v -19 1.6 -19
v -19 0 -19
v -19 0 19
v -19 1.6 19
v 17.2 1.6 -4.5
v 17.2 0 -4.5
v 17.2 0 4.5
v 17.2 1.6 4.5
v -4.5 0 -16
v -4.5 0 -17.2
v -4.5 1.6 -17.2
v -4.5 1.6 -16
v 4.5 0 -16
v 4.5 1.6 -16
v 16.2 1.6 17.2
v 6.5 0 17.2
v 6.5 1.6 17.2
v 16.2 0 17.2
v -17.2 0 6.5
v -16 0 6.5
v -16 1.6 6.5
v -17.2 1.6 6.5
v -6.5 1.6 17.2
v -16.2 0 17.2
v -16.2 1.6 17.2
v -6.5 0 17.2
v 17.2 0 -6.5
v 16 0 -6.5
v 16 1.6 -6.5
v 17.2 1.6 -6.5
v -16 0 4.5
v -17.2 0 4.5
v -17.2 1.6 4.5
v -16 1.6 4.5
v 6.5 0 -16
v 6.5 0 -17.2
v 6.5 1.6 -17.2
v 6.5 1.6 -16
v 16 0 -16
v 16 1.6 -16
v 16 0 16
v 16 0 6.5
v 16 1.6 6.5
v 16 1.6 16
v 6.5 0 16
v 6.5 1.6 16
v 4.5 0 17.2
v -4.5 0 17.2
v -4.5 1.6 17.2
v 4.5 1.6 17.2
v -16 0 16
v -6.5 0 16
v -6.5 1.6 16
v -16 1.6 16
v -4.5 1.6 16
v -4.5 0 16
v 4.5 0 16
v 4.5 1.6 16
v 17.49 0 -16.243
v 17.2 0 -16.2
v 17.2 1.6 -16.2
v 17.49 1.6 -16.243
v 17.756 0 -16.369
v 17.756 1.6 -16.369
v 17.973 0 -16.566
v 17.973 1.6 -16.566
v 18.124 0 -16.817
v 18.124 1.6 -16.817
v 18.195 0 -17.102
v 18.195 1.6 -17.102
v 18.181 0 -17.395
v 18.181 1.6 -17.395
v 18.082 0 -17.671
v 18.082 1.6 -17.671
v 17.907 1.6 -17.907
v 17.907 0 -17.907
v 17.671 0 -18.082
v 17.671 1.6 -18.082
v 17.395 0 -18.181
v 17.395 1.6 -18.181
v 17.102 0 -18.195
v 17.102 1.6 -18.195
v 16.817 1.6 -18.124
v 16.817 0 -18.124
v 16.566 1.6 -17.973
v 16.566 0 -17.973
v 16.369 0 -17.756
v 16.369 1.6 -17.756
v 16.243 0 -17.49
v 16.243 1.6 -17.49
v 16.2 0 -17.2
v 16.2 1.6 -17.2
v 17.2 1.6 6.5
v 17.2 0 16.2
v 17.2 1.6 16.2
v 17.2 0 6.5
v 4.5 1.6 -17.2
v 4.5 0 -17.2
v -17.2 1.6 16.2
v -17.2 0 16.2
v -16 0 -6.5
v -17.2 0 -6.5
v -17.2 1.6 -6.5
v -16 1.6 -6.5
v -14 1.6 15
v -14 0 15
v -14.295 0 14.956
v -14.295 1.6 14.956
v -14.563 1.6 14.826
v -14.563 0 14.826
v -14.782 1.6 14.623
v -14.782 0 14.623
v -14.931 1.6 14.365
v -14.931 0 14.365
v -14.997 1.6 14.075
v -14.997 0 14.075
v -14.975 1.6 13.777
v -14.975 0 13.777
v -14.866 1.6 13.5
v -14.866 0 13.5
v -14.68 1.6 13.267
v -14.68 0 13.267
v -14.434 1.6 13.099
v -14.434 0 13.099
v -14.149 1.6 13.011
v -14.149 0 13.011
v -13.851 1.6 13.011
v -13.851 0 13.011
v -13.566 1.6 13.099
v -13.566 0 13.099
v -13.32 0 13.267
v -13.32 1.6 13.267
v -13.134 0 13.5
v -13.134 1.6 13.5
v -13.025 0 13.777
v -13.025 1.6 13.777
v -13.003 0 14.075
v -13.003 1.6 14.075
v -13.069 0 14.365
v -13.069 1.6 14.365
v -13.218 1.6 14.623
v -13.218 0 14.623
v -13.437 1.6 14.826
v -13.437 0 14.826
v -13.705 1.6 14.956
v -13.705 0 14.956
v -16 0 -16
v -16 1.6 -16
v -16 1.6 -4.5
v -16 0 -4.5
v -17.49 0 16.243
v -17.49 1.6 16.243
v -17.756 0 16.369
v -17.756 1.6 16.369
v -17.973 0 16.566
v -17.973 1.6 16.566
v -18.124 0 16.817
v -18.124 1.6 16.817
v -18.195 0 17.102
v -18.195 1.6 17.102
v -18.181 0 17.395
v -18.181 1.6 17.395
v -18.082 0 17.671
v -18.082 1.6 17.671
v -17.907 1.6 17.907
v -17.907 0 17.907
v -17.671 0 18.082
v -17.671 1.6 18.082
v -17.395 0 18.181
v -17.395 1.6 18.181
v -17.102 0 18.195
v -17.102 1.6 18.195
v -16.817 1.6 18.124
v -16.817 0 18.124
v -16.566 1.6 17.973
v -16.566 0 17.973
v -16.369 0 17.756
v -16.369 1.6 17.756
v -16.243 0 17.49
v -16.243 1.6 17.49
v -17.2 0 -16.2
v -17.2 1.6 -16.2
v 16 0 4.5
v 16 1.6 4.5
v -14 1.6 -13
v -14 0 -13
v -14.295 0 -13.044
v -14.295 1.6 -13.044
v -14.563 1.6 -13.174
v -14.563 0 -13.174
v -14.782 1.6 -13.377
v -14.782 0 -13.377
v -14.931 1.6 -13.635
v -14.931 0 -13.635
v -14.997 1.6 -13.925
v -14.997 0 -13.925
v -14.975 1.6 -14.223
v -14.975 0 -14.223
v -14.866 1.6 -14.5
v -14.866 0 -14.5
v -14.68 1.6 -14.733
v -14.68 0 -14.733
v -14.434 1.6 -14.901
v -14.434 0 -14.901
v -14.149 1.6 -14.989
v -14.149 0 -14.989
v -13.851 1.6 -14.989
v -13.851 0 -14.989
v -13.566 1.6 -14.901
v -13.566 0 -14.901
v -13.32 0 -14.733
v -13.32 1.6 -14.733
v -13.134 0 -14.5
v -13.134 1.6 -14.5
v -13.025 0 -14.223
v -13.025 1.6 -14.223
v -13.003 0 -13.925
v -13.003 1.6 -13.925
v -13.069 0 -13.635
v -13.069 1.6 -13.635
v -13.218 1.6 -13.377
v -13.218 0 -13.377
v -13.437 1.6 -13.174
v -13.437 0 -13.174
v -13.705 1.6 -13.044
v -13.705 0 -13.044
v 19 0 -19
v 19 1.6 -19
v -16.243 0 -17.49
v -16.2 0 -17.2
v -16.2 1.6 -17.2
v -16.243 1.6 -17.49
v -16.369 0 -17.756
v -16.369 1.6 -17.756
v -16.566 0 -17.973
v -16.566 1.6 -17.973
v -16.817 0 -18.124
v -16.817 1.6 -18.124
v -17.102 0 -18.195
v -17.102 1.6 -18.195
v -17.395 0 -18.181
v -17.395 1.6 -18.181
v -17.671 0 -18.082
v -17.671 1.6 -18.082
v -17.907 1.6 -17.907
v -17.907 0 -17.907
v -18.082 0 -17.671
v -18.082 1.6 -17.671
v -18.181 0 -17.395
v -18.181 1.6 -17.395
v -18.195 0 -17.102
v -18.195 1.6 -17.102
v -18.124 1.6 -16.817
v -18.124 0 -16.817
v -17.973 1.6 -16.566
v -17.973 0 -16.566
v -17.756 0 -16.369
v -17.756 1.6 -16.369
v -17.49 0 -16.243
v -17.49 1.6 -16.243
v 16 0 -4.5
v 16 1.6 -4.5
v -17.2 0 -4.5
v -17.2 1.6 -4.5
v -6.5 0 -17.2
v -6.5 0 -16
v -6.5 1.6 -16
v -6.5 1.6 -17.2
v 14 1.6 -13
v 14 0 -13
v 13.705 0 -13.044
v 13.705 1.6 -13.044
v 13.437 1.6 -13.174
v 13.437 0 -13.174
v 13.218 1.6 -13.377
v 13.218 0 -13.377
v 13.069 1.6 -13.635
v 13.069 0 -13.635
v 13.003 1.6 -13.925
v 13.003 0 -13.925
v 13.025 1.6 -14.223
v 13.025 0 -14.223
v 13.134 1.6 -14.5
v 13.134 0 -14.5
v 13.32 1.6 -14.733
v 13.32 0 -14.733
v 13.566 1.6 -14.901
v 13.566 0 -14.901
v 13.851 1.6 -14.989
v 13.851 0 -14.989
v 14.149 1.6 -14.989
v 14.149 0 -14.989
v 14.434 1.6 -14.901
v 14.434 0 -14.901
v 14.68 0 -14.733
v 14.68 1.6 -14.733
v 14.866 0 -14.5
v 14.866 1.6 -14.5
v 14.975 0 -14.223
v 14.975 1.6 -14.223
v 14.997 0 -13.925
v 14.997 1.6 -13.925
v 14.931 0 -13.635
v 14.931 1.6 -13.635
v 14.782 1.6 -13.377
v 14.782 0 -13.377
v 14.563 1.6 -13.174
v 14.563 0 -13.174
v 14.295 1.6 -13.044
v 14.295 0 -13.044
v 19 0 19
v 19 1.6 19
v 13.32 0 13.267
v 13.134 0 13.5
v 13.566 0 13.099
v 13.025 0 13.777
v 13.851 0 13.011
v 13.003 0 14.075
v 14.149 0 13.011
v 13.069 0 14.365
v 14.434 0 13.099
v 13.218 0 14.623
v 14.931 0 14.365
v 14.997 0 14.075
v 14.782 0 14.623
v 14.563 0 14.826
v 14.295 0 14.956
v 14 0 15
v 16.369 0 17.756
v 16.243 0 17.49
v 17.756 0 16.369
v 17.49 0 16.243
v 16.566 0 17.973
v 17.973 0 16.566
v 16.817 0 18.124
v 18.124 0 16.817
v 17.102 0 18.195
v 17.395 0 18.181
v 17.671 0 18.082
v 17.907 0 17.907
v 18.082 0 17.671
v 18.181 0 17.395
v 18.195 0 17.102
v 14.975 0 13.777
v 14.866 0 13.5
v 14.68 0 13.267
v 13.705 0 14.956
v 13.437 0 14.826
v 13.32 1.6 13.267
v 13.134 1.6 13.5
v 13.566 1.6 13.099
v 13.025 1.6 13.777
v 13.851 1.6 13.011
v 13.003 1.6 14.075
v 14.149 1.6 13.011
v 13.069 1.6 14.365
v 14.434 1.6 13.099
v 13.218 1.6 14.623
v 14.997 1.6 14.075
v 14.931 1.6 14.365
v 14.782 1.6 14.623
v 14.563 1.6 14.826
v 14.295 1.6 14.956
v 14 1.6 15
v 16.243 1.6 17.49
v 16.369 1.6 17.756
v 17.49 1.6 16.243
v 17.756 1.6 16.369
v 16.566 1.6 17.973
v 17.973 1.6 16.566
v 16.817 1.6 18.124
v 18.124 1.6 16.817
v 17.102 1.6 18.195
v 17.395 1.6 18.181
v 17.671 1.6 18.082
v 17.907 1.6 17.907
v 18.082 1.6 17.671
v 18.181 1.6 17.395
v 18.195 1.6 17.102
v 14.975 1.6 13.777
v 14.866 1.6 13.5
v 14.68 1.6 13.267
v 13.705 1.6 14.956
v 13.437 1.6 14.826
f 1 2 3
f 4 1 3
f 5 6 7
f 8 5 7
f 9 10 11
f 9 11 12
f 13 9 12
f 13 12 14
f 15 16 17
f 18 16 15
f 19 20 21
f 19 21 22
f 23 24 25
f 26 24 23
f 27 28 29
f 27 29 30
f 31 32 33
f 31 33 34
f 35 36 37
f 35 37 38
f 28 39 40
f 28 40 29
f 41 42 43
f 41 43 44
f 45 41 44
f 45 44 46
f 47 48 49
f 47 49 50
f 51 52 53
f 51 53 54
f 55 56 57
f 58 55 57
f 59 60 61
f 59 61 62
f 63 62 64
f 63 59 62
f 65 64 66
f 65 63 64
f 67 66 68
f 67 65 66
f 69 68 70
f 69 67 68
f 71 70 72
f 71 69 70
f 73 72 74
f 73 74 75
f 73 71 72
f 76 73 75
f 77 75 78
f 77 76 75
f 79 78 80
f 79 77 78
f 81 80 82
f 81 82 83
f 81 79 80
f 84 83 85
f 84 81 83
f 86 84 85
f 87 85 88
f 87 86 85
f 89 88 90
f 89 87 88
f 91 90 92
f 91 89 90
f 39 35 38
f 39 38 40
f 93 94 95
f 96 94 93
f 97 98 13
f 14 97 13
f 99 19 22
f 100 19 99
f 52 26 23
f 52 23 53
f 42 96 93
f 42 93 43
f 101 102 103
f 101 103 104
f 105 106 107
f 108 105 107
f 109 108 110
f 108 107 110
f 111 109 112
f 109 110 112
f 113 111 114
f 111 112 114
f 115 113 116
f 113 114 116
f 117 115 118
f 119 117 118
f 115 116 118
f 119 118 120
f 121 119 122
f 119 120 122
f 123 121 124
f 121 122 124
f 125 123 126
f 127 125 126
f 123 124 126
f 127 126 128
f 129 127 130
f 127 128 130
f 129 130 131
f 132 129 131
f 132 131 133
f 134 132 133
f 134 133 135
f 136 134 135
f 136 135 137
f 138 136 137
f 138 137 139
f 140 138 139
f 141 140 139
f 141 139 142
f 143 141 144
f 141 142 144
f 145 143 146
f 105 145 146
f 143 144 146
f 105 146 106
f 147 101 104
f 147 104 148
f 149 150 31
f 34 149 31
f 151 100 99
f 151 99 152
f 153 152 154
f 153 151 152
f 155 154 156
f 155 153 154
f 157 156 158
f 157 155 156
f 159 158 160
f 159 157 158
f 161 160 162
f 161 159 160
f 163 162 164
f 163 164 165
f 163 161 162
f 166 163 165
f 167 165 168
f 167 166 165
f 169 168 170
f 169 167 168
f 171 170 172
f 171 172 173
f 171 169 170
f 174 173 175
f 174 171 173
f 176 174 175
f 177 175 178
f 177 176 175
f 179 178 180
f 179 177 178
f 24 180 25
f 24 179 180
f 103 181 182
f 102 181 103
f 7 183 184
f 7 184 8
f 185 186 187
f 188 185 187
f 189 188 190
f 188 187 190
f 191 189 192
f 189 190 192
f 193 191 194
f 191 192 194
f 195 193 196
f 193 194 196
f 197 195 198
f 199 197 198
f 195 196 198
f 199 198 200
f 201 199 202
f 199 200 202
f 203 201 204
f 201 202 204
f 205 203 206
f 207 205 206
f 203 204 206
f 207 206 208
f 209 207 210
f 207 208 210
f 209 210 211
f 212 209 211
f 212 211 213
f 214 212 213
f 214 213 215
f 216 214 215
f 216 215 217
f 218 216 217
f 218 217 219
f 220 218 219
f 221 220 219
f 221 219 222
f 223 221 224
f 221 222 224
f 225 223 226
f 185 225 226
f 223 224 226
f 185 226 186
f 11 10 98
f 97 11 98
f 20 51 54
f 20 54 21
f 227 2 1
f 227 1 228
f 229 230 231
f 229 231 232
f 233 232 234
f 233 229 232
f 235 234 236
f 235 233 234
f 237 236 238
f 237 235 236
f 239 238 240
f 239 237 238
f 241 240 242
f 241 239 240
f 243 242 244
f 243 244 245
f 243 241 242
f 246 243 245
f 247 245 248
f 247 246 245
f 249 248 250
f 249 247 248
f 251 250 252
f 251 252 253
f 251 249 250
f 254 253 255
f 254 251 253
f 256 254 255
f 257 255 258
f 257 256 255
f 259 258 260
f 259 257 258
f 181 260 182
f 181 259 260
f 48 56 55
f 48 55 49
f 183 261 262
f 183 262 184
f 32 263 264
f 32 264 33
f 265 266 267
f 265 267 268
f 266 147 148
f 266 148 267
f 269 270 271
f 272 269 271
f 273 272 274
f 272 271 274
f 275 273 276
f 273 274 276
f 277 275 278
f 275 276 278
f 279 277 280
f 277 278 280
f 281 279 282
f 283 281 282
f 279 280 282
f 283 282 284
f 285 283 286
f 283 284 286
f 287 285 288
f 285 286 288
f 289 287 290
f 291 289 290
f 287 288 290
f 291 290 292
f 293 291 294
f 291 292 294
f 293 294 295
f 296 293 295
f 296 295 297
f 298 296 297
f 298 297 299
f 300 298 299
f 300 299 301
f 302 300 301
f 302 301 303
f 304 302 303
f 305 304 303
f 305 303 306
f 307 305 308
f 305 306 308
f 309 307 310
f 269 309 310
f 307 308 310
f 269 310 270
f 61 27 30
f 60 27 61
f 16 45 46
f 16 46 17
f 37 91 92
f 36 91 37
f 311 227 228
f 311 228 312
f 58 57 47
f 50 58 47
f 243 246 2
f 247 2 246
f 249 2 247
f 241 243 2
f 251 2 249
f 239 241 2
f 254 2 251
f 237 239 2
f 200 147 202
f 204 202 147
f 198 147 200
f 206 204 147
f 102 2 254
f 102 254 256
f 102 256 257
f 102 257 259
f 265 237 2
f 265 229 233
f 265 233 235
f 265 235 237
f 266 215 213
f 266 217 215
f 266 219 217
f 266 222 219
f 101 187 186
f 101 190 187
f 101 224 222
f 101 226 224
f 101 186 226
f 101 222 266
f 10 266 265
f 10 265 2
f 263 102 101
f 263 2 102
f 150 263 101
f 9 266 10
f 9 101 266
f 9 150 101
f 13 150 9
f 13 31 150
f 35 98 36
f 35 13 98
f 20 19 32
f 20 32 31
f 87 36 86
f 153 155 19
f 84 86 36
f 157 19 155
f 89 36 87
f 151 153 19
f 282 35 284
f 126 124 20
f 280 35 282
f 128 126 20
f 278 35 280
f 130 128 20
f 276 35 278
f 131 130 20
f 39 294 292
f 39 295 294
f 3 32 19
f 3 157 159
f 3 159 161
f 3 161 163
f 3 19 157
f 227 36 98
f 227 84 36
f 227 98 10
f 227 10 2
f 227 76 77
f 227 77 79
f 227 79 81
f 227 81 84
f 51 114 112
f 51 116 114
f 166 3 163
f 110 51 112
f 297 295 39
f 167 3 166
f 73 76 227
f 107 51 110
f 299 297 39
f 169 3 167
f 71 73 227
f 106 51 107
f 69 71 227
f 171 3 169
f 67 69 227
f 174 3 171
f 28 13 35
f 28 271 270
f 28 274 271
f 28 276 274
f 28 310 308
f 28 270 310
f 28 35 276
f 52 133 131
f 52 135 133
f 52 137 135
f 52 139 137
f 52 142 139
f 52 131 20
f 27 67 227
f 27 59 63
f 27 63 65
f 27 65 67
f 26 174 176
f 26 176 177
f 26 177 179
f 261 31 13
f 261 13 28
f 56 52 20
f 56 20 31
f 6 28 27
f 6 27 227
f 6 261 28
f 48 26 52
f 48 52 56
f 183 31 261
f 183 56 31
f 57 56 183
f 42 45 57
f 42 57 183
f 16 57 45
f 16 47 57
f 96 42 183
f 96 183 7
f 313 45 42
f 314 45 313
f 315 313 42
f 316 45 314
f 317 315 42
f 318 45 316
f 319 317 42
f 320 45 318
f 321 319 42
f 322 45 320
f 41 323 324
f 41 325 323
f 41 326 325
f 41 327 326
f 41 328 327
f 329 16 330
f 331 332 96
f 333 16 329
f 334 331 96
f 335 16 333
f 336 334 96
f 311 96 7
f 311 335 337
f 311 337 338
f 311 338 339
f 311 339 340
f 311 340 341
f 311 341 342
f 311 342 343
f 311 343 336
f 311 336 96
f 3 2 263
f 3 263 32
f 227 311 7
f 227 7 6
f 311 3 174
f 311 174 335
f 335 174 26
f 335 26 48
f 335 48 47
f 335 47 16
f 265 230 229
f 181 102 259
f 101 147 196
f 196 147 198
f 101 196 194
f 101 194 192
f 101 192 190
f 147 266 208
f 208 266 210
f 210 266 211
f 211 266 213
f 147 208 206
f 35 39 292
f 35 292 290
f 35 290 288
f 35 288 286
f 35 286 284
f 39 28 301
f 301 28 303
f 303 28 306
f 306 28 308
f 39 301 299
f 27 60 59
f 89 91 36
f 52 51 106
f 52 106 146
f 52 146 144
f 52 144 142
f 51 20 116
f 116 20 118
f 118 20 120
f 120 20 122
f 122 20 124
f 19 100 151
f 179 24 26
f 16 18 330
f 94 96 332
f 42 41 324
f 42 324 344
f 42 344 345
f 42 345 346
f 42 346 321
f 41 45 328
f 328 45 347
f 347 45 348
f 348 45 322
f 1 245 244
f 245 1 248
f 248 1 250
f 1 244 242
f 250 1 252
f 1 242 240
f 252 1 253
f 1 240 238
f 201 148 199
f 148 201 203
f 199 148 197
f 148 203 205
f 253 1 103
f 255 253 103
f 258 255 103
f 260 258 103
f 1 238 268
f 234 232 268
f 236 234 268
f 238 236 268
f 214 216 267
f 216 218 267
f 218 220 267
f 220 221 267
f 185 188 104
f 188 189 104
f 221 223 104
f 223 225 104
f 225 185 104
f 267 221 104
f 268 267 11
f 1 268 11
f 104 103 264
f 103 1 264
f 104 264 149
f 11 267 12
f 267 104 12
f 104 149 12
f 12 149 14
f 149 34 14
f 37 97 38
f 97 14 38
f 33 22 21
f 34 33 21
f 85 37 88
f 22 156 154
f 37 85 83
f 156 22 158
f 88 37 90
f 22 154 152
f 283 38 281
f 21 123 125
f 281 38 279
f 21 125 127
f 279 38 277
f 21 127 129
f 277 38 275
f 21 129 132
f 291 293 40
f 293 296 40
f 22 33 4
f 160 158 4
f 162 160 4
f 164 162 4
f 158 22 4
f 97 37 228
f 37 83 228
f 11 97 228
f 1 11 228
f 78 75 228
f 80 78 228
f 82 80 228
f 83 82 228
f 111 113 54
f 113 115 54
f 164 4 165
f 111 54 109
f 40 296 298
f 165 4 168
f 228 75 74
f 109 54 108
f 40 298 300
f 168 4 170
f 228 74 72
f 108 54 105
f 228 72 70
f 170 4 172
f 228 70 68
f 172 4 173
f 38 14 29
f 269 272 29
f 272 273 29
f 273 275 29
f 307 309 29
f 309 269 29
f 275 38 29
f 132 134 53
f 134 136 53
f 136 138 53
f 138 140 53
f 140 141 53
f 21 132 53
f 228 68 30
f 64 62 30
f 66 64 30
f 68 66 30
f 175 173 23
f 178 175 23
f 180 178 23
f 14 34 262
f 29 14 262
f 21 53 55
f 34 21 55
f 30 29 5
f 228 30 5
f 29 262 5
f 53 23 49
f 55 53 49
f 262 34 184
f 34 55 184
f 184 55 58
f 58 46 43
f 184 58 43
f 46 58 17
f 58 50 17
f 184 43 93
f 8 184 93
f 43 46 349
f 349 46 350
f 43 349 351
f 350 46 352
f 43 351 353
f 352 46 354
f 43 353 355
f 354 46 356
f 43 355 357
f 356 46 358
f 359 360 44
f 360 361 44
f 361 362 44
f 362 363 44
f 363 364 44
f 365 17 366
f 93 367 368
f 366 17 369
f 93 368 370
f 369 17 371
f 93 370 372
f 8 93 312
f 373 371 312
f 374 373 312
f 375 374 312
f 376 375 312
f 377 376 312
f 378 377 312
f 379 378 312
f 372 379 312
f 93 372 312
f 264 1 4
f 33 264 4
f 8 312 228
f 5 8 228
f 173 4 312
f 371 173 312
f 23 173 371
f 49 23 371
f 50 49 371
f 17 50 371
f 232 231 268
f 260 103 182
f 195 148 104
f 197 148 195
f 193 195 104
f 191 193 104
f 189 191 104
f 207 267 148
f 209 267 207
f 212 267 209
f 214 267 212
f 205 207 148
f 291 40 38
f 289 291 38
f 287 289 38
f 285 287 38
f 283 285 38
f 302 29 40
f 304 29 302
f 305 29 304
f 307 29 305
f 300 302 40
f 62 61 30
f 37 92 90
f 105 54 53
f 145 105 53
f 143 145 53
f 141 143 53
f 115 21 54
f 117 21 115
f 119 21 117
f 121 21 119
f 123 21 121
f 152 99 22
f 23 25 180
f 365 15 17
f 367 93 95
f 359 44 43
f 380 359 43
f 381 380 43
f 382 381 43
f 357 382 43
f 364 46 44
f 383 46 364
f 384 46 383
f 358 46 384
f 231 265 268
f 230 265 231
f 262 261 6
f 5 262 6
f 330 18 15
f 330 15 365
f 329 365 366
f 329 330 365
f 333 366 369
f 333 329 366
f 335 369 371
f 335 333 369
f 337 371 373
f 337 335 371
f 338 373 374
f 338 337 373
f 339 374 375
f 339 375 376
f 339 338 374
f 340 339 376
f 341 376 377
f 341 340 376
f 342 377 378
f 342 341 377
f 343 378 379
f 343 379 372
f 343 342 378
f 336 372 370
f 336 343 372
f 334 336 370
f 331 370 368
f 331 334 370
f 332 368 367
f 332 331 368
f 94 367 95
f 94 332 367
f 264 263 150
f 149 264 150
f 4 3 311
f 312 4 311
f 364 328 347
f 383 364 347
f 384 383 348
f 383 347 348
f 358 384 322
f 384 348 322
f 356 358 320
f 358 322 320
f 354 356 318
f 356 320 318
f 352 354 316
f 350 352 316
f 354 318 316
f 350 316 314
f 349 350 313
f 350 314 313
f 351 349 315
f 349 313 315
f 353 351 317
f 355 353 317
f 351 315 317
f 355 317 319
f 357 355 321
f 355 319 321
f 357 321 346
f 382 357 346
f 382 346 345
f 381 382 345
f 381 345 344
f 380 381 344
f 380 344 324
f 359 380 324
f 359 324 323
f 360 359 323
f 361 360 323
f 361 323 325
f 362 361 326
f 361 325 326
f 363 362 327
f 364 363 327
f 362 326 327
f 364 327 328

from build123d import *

# Parameters (mm, degrees)
SKETCH1_W           = 38
SKETCH1_H           = 38
SKETCH1_R           = 1
SKETCH1_W_2         = 9
SKETCH1_H_2         = 1.2
SKETCH1_W_3         = 1.2
SKETCH1_H_3         = 9
BOSS_EXTRUDE1_DEPTH = 1.6


with BuildPart() as part:
    # Sketch1 → Boss-Extrude1 (new body)
    with BuildSketch(Plane.XZ):
        Rectangle(SKETCH1_W, SKETCH1_H)
        with Locations(Location((-14, -14, 0), (0, 0, 90))):
            Circle(SKETCH1_R, mode=Mode.SUBTRACT)
        with Locations(Location((-14, 14, 0), (0, 0, 90))):
            Circle(SKETCH1_R, mode=Mode.SUBTRACT)
        with Locations(Location((14, -14, 0), (0, 0, 90))):
            Circle(SKETCH1_R, mode=Mode.SUBTRACT)
        with Locations(Location((14, 14, 0), (0, 0, 90))):
            Circle(SKETCH1_R, mode=Mode.SUBTRACT)
        with BuildLine():
            Line((6.5, 17.2), (16.2, 17.2))
            ThreePointArc((16.2, 17.2), (17.907106781, 17.907106781), (17.2, 16.2))
            Line((17.2, 16.2), (17.2, 6.5))
            Line((17.2, 6.5), (16, 6.5))
            Line((16, 6.5), (16, 16))
            Line((16, 16), (6.5, 16))
            Line((6.5, 16), (6.5, 17.2))
        make_face(mode=Mode.SUBTRACT)
        with BuildLine():
            Line((-6.5, -17.2), (-16.2, -17.2))
            ThreePointArc((-16.2, -17.2), (-17.907106781, -17.907106781), (-17.2, -16.2))
            Line((-17.2, -16.2), (-17.2, -6.5))
            Line((-17.2, -6.5), (-16, -6.5))
            Line((-16, -6.5), (-16, -16))
            Line((-16, -16), (-6.5, -16))
            Line((-6.5, -16), (-6.5, -17.2))
        make_face(mode=Mode.SUBTRACT)
        with Locations((0, 16.6)):
            Rectangle(SKETCH1_W_2, SKETCH1_H_2, mode=Mode.SUBTRACT)
        with BuildLine():
            Line((6.5, -16), (16, -16))
            Line((16, -16), (16, -6.5))
            Line((16, -6.5), (17.2, -6.5))
            Line((17.2, -6.5), (17.2, -16.2))
            ThreePointArc((17.2, -16.2), (17.907106781, -17.907106781), (16.2, -17.2))
            Line((16.2, -17.2), (6.5, -17.2))
            Line((6.5, -17.2), (6.5, -16))
        make_face(mode=Mode.SUBTRACT)
        with Locations((-16.6, 0)):
            Rectangle(SKETCH1_W_3, SKETCH1_H_3, mode=Mode.SUBTRACT)
        with Locations((16.6, 0)):
            Rectangle(SKETCH1_W_3, SKETCH1_H_3, mode=Mode.SUBTRACT)
        with BuildLine():
            Line((-16, 16), (-16, 6.5))
            Line((-16, 6.5), (-17.2, 6.5))
            Line((-17.2, 6.5), (-17.2, 16.2))
            ThreePointArc((-17.2, 16.2), (-17.907106781, 17.907106781), (-16.2, 17.2))
            Line((-16.2, 17.2), (-6.5, 17.2))
            Line((-6.5, 17.2), (-6.5, 16))
            Line((-6.5, 16), (-16, 16))
        make_face(mode=Mode.SUBTRACT)
        with Locations((0, -16.6)):
            Rectangle(SKETCH1_W_2, SKETCH1_H_2, mode=Mode.SUBTRACT)
    extrude(amount=-BOSS_EXTRUDE1_DEPTH)


solid = part.part
